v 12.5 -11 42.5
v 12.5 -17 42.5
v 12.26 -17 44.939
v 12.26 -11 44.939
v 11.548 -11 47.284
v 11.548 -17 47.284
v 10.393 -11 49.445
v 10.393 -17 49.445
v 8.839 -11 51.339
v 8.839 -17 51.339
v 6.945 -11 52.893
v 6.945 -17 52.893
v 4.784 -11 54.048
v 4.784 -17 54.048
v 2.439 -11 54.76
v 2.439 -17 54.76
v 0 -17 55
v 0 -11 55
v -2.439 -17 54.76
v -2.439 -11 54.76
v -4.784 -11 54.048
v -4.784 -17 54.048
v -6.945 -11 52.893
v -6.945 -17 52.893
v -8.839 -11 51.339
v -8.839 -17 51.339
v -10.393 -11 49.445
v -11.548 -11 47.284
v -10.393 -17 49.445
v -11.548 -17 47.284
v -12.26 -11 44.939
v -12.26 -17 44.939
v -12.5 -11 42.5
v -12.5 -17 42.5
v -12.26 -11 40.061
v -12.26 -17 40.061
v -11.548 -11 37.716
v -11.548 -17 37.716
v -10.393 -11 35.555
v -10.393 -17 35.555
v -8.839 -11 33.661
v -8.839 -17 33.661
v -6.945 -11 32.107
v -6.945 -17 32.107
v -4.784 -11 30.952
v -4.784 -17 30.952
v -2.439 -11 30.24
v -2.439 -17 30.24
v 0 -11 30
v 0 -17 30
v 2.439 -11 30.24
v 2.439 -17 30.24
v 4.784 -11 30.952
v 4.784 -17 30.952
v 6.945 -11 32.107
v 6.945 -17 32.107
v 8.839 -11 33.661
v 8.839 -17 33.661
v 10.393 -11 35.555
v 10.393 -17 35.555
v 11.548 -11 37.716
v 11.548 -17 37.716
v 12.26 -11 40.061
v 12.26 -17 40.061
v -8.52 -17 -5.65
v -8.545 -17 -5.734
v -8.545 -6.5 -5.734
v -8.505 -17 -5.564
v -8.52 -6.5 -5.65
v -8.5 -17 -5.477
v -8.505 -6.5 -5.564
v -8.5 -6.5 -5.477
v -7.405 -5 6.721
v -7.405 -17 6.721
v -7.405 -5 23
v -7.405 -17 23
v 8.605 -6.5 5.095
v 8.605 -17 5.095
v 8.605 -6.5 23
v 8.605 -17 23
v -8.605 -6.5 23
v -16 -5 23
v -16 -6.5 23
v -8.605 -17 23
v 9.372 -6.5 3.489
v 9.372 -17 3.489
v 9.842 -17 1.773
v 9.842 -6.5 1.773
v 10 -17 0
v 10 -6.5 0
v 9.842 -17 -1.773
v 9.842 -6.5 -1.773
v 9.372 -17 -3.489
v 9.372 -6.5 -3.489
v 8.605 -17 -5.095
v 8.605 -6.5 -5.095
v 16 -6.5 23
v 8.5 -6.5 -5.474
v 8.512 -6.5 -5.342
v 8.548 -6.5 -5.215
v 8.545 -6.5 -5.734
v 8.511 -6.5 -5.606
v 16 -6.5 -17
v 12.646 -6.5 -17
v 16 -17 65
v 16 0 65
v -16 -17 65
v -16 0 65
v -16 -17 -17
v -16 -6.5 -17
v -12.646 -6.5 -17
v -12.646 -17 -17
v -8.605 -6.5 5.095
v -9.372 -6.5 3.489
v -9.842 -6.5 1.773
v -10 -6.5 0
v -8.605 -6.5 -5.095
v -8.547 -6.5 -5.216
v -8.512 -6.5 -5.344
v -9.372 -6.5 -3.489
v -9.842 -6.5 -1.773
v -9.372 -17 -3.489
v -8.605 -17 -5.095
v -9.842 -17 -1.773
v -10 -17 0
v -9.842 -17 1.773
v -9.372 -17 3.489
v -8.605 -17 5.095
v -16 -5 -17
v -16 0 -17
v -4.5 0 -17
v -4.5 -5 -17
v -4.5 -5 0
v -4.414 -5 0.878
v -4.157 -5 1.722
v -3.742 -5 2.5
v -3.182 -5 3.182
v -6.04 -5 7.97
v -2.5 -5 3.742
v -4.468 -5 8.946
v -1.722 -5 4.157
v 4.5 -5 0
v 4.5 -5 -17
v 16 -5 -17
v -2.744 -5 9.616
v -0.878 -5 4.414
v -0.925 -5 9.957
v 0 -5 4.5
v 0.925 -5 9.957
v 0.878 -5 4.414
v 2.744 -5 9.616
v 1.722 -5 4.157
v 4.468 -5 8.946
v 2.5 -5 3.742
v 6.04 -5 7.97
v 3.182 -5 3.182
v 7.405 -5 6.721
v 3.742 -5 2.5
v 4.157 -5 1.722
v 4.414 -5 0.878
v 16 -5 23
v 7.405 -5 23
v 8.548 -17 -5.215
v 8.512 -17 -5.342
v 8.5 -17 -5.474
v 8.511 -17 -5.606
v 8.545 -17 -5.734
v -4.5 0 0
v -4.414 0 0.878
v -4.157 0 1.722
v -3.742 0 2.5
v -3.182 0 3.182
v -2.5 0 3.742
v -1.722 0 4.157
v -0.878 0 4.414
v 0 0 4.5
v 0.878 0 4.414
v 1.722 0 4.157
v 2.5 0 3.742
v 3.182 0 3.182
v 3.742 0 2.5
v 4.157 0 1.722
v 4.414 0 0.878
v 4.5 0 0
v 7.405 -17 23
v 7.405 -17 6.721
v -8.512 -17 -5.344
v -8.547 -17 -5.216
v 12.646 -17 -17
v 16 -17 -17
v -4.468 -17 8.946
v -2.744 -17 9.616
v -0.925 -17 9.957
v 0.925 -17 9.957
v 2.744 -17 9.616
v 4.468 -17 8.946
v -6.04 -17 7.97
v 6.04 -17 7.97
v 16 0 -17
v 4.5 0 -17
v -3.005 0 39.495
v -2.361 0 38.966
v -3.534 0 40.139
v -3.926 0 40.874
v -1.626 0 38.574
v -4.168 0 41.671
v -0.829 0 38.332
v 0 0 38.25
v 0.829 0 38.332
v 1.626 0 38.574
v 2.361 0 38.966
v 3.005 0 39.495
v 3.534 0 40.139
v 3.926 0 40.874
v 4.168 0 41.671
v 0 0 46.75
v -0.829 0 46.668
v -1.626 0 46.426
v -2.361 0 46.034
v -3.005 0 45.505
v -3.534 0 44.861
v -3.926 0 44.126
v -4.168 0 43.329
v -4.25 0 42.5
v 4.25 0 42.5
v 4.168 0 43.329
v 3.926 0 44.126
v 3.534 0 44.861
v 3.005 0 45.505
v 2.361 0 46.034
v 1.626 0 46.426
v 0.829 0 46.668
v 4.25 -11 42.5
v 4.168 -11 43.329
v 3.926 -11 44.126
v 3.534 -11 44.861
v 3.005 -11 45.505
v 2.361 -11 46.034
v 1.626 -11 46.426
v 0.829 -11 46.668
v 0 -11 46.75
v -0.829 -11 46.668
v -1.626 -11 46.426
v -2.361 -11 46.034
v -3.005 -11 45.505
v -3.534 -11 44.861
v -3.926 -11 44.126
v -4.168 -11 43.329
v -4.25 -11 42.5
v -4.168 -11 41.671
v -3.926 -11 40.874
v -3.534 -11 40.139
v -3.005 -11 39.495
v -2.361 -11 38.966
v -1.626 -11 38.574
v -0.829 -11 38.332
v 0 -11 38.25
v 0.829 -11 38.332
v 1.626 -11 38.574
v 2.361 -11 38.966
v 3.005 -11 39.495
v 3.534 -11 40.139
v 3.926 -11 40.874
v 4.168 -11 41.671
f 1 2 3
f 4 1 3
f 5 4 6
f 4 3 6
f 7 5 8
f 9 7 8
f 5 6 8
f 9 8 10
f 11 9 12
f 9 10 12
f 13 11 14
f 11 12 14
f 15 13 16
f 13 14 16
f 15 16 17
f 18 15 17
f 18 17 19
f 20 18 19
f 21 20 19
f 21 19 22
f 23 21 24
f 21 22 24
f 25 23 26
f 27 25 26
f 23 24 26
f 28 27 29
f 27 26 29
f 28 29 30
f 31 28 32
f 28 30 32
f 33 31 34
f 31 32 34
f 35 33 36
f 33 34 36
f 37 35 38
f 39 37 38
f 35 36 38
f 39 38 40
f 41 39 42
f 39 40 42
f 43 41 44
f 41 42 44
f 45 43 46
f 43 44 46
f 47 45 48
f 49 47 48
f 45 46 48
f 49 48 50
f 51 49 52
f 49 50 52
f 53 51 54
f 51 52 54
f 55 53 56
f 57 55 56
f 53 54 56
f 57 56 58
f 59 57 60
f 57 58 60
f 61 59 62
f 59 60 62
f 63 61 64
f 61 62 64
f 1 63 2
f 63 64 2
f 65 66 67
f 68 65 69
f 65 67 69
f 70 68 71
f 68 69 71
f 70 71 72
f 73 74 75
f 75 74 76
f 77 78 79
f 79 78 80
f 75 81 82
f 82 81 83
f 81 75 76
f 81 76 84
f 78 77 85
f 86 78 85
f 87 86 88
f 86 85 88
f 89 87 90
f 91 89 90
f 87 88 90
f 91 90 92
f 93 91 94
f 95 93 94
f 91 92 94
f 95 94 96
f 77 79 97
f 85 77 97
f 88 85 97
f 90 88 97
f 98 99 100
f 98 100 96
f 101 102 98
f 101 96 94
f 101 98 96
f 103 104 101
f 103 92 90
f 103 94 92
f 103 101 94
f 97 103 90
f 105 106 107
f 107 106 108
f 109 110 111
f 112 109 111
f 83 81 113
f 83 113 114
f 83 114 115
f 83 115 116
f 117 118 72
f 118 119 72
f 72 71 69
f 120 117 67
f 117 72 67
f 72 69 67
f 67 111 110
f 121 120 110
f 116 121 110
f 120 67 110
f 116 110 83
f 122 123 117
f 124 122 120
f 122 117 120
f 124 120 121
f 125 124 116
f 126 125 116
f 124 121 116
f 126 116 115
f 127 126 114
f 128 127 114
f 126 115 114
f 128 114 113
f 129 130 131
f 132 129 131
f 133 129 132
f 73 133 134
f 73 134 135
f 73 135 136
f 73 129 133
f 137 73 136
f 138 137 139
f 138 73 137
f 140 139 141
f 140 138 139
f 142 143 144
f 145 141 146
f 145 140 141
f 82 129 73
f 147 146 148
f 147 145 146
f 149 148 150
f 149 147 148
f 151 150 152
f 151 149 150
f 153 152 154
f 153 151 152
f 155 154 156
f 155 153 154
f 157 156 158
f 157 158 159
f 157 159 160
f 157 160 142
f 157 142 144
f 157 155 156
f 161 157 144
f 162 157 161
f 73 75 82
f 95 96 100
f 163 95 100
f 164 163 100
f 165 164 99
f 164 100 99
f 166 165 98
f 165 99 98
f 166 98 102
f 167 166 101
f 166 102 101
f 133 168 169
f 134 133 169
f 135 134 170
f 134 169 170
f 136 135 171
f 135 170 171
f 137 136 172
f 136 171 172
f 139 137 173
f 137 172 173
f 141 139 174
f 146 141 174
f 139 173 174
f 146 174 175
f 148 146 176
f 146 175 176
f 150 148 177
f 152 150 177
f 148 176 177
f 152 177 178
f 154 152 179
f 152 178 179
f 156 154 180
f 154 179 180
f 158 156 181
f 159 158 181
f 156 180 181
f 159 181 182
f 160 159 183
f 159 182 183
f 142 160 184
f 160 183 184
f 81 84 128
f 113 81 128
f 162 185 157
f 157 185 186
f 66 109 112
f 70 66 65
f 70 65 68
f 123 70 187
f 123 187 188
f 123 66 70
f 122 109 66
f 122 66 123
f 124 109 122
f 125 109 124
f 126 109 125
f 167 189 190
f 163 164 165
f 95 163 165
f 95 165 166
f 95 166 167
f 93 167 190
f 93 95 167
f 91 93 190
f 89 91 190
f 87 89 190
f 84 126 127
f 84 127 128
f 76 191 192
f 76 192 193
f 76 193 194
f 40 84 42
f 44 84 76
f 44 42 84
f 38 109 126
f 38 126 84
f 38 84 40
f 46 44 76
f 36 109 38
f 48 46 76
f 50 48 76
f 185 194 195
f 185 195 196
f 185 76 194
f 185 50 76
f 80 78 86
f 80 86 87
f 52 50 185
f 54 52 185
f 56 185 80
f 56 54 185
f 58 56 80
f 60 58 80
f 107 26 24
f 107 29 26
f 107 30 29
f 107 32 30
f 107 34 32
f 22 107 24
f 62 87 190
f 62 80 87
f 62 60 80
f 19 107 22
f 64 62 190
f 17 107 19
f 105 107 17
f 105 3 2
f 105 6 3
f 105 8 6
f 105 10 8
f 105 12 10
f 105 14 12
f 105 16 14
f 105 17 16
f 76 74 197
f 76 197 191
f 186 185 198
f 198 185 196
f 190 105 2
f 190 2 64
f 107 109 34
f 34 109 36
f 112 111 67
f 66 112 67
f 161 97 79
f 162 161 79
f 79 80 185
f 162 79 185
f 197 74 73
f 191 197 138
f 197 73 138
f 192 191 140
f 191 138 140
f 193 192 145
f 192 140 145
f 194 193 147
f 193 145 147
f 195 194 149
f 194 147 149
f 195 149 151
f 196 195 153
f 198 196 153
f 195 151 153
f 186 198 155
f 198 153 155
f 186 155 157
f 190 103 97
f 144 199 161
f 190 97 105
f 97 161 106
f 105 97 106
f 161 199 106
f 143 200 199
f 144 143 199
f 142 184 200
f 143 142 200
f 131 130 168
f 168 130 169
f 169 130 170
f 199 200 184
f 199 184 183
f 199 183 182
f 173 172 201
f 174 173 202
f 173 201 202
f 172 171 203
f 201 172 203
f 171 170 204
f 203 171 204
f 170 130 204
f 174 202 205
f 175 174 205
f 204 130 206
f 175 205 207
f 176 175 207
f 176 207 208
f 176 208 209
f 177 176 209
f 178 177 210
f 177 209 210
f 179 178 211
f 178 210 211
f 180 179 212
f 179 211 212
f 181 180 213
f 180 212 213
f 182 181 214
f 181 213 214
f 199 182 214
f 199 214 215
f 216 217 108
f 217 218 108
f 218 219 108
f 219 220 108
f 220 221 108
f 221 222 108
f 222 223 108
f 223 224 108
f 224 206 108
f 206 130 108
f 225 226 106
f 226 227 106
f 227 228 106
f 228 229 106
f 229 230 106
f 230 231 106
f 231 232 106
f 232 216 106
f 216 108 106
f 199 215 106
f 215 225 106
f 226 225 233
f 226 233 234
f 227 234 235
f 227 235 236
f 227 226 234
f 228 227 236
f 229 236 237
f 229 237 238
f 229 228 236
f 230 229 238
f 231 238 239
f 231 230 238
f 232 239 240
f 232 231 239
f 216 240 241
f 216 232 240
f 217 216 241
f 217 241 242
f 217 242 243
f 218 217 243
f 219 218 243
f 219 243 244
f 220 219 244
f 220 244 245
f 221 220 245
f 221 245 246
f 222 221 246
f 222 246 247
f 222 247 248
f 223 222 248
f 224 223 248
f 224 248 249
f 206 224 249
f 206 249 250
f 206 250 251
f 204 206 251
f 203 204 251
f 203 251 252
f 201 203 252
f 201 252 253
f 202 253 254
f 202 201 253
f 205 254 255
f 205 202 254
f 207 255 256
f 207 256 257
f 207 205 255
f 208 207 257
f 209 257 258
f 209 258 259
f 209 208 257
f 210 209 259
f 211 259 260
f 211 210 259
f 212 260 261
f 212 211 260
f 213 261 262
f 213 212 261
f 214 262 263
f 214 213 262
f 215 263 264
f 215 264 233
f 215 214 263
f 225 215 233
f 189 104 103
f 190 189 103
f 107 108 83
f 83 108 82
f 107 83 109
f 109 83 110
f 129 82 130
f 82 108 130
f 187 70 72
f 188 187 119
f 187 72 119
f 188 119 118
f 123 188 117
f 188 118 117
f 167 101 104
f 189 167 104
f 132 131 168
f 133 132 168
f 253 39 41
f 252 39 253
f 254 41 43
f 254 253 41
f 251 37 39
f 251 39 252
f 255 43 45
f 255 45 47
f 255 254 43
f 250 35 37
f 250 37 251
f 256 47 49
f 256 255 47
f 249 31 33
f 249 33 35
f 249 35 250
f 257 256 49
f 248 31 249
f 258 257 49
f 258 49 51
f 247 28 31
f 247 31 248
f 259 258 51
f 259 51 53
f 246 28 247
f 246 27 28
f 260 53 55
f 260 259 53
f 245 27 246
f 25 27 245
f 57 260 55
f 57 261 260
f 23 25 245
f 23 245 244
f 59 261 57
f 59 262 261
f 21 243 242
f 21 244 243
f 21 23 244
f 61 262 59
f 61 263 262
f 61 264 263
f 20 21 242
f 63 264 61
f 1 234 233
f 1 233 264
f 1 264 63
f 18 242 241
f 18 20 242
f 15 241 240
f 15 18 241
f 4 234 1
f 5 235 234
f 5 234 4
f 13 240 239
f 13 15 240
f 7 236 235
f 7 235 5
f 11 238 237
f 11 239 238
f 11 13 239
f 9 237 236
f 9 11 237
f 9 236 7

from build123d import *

# Parameters (mm, degrees)
F0_R     = 4.25
F1_DEPTH = 17
F2_DEPTH = 5
F4_DEPTH = 12
F5_W     = 4.6458135775
F5_H     = 1.5
F5_W_2   = 3.3541864225
F5_W_3   = 8
F6_DEPTH = 40
F7_R     = 12.5
F7_R_2   = 4.25
F8_DEPTH = 6


# Not quite as in the source:
# - a feature names something its author has since deleted; it is built from what else it names


with BuildPart() as f1:
    # F0 (on Front) → F1 (new body)
    with BuildSketch(Plane.XZ):
        with BuildLine():
            ThreePointArc((-8.5, -5.4772255751), (-8.5266357667, -5.2791241211), (-8.6046511628, -5.0950935582))
            ThreePointArc((-8.6046511628, -5.0950935582), (-9.9967746616, -5.5467065419), (-8.5452305344, -5.7337406825))
            ThreePointArc((-8.5452305344, -5.7337406825), (-8.5113941852, -5.6074617083), (-8.5, -5.4772255751))
        make_face()
        with BuildLine():
            ThreePointArc((-8.6046511628, -5.0950935582), (0, 10), (8.6046511628, -5.0950935582))
            ThreePointArc((8.6046511628, -5.0950935582), (9.4481014539, -4.7538613418), (10, -5.4772255751))
            ThreePointArc((10, -5.4772255751), (9.3802361333, -6.2158313898), (8.5452305344, -5.7337406825))
            Line((8.5452305344, -5.7337406825), (12.6458135775, -17))
            Line((12.6458135775, -17), (16, -17))
            Line((16, -17), (16, 65))
            Line((16, 65), (-16, 65))
            Line((-16, 65), (-16, -17))
            Line((-16, -17), (-12.6458135775, -17))
            Line((-12.6458135775, -17), (-8.5452305344, -5.7337406825))
            ThreePointArc((-8.5452305344, -5.7337406825), (-9.9967746616, -5.5467065419), (-8.6046511628, -5.0950935582))
        make_face()
        with Locations((0, 42.5)):
            Circle(F0_R, mode=Mode.SUBTRACT)
        with BuildLine():
            ThreePointArc((10, -5.4772255751), (9.4481014539, -4.7538613418), (8.6046511628, -5.0950935582))
            ThreePointArc((8.6046511628, -5.0950935582), (8.5032253384, -5.4077446082), (8.5452305344, -5.7337406825))
            ThreePointArc((8.5452305344, -5.7337406825), (9.3802361333, -6.2158313898), (10, -5.4772255751))
        make_face()
    extrude(amount=F1_DEPTH)

    # F0 (on Front) → F2 (join)
    with BuildSketch(Plane.XZ):
        with BuildLine():
            ThreePointArc((8.5452305344, -5.7337406825), (8.5032253384, -5.4077446082), (8.6046511628, -5.0950935582))
            ThreePointArc((8.6046511628, -5.0950935582), (0, 10), (-8.6046511628, -5.0950935582))
            ThreePointArc((-8.6046511628, -5.0950935582), (-8.5266357667, -5.2791241211), (-8.5, -5.4772255751))
            ThreePointArc((-8.5, -5.4772255751), (-8.5113941852, -5.6074617083), (-8.5452305344, -5.7337406825))
            Line((-8.5452305344, -5.7337406825), (-12.6458135775, -17))
            Line((-12.6458135775, -17), (-4.5, -17))
            Line((-4.5, -17), (-4.5, 0))
            ThreePointArc((-4.5, 0), (0, 4.5), (4.5, 0))
            Line((4.5, 0), (4.5, -17))
            Line((4.5, -17), (12.6458135775, -17))
            Line((12.6458135775, -17), (8.5452305344, -5.7337406825))
        make_face()
    extrude(amount=F2_DEPTH)

    # F3 (on face) → F4 (cut)
    with BuildSketch(Plane.XZ.offset(17)):
        with BuildLine():
            Line((-8.6046511628, 23), (-8.6046511628, 5.0950935582))
            ThreePointArc((-8.6046511628, 5.0950935582), (-8.0458244358, 5.938409648), (-7.4046511628, 6.7209479359))
            Line((-7.4046511628, 6.7209479359), (-7.4046511628, 23))
            Line((-7.4046511628, 23), (-8.6046511628, 23))
        make_face()
        with BuildLine():
            Line((7.4046511628, 23), (7.4046511628, 6.7209479359))
            ThreePointArc((7.4046511628, 6.7209479359), (8.0458244358, 5.938409648), (8.6046511628, 5.0950935582))
            Line((8.6046511628, 5.0950935582), (8.6046511628, 23))
            Line((8.6046511628, 23), (7.4046511628, 23))
        make_face()
    extrude(amount=-F4_DEPTH, mode=Mode.SUBTRACT)

    # F5 (on face) → F6 (cut)
    with BuildSketch(Plane(origin=(0, 0, -17), x_dir=(1, 0, 0), z_dir=(0, 0, -1))):
        with Locations((-10.3229067887, 5.75)):
            Rectangle(F5_W, F5_H)
        with Locations((-14.3229067887, 5.75)):
            Rectangle(F5_W_2, F5_H)
        with Locations((12, 5.75)):
            Rectangle(F5_W_3, F5_H)
    extrude(amount=-F6_DEPTH, mode=Mode.SUBTRACT)

    # F7 (on face) → F8 (cut)
    with BuildSketch(Plane.XZ.offset(17)):
        with Locations((0, 42.5)):
            Circle(F7_R)
        with Locations((0, 42.5)):
            Circle(F7_R_2, mode=Mode.SUBTRACT)
    extrude(amount=-F8_DEPTH, mode=Mode.SUBTRACT)


solid = f1.part
